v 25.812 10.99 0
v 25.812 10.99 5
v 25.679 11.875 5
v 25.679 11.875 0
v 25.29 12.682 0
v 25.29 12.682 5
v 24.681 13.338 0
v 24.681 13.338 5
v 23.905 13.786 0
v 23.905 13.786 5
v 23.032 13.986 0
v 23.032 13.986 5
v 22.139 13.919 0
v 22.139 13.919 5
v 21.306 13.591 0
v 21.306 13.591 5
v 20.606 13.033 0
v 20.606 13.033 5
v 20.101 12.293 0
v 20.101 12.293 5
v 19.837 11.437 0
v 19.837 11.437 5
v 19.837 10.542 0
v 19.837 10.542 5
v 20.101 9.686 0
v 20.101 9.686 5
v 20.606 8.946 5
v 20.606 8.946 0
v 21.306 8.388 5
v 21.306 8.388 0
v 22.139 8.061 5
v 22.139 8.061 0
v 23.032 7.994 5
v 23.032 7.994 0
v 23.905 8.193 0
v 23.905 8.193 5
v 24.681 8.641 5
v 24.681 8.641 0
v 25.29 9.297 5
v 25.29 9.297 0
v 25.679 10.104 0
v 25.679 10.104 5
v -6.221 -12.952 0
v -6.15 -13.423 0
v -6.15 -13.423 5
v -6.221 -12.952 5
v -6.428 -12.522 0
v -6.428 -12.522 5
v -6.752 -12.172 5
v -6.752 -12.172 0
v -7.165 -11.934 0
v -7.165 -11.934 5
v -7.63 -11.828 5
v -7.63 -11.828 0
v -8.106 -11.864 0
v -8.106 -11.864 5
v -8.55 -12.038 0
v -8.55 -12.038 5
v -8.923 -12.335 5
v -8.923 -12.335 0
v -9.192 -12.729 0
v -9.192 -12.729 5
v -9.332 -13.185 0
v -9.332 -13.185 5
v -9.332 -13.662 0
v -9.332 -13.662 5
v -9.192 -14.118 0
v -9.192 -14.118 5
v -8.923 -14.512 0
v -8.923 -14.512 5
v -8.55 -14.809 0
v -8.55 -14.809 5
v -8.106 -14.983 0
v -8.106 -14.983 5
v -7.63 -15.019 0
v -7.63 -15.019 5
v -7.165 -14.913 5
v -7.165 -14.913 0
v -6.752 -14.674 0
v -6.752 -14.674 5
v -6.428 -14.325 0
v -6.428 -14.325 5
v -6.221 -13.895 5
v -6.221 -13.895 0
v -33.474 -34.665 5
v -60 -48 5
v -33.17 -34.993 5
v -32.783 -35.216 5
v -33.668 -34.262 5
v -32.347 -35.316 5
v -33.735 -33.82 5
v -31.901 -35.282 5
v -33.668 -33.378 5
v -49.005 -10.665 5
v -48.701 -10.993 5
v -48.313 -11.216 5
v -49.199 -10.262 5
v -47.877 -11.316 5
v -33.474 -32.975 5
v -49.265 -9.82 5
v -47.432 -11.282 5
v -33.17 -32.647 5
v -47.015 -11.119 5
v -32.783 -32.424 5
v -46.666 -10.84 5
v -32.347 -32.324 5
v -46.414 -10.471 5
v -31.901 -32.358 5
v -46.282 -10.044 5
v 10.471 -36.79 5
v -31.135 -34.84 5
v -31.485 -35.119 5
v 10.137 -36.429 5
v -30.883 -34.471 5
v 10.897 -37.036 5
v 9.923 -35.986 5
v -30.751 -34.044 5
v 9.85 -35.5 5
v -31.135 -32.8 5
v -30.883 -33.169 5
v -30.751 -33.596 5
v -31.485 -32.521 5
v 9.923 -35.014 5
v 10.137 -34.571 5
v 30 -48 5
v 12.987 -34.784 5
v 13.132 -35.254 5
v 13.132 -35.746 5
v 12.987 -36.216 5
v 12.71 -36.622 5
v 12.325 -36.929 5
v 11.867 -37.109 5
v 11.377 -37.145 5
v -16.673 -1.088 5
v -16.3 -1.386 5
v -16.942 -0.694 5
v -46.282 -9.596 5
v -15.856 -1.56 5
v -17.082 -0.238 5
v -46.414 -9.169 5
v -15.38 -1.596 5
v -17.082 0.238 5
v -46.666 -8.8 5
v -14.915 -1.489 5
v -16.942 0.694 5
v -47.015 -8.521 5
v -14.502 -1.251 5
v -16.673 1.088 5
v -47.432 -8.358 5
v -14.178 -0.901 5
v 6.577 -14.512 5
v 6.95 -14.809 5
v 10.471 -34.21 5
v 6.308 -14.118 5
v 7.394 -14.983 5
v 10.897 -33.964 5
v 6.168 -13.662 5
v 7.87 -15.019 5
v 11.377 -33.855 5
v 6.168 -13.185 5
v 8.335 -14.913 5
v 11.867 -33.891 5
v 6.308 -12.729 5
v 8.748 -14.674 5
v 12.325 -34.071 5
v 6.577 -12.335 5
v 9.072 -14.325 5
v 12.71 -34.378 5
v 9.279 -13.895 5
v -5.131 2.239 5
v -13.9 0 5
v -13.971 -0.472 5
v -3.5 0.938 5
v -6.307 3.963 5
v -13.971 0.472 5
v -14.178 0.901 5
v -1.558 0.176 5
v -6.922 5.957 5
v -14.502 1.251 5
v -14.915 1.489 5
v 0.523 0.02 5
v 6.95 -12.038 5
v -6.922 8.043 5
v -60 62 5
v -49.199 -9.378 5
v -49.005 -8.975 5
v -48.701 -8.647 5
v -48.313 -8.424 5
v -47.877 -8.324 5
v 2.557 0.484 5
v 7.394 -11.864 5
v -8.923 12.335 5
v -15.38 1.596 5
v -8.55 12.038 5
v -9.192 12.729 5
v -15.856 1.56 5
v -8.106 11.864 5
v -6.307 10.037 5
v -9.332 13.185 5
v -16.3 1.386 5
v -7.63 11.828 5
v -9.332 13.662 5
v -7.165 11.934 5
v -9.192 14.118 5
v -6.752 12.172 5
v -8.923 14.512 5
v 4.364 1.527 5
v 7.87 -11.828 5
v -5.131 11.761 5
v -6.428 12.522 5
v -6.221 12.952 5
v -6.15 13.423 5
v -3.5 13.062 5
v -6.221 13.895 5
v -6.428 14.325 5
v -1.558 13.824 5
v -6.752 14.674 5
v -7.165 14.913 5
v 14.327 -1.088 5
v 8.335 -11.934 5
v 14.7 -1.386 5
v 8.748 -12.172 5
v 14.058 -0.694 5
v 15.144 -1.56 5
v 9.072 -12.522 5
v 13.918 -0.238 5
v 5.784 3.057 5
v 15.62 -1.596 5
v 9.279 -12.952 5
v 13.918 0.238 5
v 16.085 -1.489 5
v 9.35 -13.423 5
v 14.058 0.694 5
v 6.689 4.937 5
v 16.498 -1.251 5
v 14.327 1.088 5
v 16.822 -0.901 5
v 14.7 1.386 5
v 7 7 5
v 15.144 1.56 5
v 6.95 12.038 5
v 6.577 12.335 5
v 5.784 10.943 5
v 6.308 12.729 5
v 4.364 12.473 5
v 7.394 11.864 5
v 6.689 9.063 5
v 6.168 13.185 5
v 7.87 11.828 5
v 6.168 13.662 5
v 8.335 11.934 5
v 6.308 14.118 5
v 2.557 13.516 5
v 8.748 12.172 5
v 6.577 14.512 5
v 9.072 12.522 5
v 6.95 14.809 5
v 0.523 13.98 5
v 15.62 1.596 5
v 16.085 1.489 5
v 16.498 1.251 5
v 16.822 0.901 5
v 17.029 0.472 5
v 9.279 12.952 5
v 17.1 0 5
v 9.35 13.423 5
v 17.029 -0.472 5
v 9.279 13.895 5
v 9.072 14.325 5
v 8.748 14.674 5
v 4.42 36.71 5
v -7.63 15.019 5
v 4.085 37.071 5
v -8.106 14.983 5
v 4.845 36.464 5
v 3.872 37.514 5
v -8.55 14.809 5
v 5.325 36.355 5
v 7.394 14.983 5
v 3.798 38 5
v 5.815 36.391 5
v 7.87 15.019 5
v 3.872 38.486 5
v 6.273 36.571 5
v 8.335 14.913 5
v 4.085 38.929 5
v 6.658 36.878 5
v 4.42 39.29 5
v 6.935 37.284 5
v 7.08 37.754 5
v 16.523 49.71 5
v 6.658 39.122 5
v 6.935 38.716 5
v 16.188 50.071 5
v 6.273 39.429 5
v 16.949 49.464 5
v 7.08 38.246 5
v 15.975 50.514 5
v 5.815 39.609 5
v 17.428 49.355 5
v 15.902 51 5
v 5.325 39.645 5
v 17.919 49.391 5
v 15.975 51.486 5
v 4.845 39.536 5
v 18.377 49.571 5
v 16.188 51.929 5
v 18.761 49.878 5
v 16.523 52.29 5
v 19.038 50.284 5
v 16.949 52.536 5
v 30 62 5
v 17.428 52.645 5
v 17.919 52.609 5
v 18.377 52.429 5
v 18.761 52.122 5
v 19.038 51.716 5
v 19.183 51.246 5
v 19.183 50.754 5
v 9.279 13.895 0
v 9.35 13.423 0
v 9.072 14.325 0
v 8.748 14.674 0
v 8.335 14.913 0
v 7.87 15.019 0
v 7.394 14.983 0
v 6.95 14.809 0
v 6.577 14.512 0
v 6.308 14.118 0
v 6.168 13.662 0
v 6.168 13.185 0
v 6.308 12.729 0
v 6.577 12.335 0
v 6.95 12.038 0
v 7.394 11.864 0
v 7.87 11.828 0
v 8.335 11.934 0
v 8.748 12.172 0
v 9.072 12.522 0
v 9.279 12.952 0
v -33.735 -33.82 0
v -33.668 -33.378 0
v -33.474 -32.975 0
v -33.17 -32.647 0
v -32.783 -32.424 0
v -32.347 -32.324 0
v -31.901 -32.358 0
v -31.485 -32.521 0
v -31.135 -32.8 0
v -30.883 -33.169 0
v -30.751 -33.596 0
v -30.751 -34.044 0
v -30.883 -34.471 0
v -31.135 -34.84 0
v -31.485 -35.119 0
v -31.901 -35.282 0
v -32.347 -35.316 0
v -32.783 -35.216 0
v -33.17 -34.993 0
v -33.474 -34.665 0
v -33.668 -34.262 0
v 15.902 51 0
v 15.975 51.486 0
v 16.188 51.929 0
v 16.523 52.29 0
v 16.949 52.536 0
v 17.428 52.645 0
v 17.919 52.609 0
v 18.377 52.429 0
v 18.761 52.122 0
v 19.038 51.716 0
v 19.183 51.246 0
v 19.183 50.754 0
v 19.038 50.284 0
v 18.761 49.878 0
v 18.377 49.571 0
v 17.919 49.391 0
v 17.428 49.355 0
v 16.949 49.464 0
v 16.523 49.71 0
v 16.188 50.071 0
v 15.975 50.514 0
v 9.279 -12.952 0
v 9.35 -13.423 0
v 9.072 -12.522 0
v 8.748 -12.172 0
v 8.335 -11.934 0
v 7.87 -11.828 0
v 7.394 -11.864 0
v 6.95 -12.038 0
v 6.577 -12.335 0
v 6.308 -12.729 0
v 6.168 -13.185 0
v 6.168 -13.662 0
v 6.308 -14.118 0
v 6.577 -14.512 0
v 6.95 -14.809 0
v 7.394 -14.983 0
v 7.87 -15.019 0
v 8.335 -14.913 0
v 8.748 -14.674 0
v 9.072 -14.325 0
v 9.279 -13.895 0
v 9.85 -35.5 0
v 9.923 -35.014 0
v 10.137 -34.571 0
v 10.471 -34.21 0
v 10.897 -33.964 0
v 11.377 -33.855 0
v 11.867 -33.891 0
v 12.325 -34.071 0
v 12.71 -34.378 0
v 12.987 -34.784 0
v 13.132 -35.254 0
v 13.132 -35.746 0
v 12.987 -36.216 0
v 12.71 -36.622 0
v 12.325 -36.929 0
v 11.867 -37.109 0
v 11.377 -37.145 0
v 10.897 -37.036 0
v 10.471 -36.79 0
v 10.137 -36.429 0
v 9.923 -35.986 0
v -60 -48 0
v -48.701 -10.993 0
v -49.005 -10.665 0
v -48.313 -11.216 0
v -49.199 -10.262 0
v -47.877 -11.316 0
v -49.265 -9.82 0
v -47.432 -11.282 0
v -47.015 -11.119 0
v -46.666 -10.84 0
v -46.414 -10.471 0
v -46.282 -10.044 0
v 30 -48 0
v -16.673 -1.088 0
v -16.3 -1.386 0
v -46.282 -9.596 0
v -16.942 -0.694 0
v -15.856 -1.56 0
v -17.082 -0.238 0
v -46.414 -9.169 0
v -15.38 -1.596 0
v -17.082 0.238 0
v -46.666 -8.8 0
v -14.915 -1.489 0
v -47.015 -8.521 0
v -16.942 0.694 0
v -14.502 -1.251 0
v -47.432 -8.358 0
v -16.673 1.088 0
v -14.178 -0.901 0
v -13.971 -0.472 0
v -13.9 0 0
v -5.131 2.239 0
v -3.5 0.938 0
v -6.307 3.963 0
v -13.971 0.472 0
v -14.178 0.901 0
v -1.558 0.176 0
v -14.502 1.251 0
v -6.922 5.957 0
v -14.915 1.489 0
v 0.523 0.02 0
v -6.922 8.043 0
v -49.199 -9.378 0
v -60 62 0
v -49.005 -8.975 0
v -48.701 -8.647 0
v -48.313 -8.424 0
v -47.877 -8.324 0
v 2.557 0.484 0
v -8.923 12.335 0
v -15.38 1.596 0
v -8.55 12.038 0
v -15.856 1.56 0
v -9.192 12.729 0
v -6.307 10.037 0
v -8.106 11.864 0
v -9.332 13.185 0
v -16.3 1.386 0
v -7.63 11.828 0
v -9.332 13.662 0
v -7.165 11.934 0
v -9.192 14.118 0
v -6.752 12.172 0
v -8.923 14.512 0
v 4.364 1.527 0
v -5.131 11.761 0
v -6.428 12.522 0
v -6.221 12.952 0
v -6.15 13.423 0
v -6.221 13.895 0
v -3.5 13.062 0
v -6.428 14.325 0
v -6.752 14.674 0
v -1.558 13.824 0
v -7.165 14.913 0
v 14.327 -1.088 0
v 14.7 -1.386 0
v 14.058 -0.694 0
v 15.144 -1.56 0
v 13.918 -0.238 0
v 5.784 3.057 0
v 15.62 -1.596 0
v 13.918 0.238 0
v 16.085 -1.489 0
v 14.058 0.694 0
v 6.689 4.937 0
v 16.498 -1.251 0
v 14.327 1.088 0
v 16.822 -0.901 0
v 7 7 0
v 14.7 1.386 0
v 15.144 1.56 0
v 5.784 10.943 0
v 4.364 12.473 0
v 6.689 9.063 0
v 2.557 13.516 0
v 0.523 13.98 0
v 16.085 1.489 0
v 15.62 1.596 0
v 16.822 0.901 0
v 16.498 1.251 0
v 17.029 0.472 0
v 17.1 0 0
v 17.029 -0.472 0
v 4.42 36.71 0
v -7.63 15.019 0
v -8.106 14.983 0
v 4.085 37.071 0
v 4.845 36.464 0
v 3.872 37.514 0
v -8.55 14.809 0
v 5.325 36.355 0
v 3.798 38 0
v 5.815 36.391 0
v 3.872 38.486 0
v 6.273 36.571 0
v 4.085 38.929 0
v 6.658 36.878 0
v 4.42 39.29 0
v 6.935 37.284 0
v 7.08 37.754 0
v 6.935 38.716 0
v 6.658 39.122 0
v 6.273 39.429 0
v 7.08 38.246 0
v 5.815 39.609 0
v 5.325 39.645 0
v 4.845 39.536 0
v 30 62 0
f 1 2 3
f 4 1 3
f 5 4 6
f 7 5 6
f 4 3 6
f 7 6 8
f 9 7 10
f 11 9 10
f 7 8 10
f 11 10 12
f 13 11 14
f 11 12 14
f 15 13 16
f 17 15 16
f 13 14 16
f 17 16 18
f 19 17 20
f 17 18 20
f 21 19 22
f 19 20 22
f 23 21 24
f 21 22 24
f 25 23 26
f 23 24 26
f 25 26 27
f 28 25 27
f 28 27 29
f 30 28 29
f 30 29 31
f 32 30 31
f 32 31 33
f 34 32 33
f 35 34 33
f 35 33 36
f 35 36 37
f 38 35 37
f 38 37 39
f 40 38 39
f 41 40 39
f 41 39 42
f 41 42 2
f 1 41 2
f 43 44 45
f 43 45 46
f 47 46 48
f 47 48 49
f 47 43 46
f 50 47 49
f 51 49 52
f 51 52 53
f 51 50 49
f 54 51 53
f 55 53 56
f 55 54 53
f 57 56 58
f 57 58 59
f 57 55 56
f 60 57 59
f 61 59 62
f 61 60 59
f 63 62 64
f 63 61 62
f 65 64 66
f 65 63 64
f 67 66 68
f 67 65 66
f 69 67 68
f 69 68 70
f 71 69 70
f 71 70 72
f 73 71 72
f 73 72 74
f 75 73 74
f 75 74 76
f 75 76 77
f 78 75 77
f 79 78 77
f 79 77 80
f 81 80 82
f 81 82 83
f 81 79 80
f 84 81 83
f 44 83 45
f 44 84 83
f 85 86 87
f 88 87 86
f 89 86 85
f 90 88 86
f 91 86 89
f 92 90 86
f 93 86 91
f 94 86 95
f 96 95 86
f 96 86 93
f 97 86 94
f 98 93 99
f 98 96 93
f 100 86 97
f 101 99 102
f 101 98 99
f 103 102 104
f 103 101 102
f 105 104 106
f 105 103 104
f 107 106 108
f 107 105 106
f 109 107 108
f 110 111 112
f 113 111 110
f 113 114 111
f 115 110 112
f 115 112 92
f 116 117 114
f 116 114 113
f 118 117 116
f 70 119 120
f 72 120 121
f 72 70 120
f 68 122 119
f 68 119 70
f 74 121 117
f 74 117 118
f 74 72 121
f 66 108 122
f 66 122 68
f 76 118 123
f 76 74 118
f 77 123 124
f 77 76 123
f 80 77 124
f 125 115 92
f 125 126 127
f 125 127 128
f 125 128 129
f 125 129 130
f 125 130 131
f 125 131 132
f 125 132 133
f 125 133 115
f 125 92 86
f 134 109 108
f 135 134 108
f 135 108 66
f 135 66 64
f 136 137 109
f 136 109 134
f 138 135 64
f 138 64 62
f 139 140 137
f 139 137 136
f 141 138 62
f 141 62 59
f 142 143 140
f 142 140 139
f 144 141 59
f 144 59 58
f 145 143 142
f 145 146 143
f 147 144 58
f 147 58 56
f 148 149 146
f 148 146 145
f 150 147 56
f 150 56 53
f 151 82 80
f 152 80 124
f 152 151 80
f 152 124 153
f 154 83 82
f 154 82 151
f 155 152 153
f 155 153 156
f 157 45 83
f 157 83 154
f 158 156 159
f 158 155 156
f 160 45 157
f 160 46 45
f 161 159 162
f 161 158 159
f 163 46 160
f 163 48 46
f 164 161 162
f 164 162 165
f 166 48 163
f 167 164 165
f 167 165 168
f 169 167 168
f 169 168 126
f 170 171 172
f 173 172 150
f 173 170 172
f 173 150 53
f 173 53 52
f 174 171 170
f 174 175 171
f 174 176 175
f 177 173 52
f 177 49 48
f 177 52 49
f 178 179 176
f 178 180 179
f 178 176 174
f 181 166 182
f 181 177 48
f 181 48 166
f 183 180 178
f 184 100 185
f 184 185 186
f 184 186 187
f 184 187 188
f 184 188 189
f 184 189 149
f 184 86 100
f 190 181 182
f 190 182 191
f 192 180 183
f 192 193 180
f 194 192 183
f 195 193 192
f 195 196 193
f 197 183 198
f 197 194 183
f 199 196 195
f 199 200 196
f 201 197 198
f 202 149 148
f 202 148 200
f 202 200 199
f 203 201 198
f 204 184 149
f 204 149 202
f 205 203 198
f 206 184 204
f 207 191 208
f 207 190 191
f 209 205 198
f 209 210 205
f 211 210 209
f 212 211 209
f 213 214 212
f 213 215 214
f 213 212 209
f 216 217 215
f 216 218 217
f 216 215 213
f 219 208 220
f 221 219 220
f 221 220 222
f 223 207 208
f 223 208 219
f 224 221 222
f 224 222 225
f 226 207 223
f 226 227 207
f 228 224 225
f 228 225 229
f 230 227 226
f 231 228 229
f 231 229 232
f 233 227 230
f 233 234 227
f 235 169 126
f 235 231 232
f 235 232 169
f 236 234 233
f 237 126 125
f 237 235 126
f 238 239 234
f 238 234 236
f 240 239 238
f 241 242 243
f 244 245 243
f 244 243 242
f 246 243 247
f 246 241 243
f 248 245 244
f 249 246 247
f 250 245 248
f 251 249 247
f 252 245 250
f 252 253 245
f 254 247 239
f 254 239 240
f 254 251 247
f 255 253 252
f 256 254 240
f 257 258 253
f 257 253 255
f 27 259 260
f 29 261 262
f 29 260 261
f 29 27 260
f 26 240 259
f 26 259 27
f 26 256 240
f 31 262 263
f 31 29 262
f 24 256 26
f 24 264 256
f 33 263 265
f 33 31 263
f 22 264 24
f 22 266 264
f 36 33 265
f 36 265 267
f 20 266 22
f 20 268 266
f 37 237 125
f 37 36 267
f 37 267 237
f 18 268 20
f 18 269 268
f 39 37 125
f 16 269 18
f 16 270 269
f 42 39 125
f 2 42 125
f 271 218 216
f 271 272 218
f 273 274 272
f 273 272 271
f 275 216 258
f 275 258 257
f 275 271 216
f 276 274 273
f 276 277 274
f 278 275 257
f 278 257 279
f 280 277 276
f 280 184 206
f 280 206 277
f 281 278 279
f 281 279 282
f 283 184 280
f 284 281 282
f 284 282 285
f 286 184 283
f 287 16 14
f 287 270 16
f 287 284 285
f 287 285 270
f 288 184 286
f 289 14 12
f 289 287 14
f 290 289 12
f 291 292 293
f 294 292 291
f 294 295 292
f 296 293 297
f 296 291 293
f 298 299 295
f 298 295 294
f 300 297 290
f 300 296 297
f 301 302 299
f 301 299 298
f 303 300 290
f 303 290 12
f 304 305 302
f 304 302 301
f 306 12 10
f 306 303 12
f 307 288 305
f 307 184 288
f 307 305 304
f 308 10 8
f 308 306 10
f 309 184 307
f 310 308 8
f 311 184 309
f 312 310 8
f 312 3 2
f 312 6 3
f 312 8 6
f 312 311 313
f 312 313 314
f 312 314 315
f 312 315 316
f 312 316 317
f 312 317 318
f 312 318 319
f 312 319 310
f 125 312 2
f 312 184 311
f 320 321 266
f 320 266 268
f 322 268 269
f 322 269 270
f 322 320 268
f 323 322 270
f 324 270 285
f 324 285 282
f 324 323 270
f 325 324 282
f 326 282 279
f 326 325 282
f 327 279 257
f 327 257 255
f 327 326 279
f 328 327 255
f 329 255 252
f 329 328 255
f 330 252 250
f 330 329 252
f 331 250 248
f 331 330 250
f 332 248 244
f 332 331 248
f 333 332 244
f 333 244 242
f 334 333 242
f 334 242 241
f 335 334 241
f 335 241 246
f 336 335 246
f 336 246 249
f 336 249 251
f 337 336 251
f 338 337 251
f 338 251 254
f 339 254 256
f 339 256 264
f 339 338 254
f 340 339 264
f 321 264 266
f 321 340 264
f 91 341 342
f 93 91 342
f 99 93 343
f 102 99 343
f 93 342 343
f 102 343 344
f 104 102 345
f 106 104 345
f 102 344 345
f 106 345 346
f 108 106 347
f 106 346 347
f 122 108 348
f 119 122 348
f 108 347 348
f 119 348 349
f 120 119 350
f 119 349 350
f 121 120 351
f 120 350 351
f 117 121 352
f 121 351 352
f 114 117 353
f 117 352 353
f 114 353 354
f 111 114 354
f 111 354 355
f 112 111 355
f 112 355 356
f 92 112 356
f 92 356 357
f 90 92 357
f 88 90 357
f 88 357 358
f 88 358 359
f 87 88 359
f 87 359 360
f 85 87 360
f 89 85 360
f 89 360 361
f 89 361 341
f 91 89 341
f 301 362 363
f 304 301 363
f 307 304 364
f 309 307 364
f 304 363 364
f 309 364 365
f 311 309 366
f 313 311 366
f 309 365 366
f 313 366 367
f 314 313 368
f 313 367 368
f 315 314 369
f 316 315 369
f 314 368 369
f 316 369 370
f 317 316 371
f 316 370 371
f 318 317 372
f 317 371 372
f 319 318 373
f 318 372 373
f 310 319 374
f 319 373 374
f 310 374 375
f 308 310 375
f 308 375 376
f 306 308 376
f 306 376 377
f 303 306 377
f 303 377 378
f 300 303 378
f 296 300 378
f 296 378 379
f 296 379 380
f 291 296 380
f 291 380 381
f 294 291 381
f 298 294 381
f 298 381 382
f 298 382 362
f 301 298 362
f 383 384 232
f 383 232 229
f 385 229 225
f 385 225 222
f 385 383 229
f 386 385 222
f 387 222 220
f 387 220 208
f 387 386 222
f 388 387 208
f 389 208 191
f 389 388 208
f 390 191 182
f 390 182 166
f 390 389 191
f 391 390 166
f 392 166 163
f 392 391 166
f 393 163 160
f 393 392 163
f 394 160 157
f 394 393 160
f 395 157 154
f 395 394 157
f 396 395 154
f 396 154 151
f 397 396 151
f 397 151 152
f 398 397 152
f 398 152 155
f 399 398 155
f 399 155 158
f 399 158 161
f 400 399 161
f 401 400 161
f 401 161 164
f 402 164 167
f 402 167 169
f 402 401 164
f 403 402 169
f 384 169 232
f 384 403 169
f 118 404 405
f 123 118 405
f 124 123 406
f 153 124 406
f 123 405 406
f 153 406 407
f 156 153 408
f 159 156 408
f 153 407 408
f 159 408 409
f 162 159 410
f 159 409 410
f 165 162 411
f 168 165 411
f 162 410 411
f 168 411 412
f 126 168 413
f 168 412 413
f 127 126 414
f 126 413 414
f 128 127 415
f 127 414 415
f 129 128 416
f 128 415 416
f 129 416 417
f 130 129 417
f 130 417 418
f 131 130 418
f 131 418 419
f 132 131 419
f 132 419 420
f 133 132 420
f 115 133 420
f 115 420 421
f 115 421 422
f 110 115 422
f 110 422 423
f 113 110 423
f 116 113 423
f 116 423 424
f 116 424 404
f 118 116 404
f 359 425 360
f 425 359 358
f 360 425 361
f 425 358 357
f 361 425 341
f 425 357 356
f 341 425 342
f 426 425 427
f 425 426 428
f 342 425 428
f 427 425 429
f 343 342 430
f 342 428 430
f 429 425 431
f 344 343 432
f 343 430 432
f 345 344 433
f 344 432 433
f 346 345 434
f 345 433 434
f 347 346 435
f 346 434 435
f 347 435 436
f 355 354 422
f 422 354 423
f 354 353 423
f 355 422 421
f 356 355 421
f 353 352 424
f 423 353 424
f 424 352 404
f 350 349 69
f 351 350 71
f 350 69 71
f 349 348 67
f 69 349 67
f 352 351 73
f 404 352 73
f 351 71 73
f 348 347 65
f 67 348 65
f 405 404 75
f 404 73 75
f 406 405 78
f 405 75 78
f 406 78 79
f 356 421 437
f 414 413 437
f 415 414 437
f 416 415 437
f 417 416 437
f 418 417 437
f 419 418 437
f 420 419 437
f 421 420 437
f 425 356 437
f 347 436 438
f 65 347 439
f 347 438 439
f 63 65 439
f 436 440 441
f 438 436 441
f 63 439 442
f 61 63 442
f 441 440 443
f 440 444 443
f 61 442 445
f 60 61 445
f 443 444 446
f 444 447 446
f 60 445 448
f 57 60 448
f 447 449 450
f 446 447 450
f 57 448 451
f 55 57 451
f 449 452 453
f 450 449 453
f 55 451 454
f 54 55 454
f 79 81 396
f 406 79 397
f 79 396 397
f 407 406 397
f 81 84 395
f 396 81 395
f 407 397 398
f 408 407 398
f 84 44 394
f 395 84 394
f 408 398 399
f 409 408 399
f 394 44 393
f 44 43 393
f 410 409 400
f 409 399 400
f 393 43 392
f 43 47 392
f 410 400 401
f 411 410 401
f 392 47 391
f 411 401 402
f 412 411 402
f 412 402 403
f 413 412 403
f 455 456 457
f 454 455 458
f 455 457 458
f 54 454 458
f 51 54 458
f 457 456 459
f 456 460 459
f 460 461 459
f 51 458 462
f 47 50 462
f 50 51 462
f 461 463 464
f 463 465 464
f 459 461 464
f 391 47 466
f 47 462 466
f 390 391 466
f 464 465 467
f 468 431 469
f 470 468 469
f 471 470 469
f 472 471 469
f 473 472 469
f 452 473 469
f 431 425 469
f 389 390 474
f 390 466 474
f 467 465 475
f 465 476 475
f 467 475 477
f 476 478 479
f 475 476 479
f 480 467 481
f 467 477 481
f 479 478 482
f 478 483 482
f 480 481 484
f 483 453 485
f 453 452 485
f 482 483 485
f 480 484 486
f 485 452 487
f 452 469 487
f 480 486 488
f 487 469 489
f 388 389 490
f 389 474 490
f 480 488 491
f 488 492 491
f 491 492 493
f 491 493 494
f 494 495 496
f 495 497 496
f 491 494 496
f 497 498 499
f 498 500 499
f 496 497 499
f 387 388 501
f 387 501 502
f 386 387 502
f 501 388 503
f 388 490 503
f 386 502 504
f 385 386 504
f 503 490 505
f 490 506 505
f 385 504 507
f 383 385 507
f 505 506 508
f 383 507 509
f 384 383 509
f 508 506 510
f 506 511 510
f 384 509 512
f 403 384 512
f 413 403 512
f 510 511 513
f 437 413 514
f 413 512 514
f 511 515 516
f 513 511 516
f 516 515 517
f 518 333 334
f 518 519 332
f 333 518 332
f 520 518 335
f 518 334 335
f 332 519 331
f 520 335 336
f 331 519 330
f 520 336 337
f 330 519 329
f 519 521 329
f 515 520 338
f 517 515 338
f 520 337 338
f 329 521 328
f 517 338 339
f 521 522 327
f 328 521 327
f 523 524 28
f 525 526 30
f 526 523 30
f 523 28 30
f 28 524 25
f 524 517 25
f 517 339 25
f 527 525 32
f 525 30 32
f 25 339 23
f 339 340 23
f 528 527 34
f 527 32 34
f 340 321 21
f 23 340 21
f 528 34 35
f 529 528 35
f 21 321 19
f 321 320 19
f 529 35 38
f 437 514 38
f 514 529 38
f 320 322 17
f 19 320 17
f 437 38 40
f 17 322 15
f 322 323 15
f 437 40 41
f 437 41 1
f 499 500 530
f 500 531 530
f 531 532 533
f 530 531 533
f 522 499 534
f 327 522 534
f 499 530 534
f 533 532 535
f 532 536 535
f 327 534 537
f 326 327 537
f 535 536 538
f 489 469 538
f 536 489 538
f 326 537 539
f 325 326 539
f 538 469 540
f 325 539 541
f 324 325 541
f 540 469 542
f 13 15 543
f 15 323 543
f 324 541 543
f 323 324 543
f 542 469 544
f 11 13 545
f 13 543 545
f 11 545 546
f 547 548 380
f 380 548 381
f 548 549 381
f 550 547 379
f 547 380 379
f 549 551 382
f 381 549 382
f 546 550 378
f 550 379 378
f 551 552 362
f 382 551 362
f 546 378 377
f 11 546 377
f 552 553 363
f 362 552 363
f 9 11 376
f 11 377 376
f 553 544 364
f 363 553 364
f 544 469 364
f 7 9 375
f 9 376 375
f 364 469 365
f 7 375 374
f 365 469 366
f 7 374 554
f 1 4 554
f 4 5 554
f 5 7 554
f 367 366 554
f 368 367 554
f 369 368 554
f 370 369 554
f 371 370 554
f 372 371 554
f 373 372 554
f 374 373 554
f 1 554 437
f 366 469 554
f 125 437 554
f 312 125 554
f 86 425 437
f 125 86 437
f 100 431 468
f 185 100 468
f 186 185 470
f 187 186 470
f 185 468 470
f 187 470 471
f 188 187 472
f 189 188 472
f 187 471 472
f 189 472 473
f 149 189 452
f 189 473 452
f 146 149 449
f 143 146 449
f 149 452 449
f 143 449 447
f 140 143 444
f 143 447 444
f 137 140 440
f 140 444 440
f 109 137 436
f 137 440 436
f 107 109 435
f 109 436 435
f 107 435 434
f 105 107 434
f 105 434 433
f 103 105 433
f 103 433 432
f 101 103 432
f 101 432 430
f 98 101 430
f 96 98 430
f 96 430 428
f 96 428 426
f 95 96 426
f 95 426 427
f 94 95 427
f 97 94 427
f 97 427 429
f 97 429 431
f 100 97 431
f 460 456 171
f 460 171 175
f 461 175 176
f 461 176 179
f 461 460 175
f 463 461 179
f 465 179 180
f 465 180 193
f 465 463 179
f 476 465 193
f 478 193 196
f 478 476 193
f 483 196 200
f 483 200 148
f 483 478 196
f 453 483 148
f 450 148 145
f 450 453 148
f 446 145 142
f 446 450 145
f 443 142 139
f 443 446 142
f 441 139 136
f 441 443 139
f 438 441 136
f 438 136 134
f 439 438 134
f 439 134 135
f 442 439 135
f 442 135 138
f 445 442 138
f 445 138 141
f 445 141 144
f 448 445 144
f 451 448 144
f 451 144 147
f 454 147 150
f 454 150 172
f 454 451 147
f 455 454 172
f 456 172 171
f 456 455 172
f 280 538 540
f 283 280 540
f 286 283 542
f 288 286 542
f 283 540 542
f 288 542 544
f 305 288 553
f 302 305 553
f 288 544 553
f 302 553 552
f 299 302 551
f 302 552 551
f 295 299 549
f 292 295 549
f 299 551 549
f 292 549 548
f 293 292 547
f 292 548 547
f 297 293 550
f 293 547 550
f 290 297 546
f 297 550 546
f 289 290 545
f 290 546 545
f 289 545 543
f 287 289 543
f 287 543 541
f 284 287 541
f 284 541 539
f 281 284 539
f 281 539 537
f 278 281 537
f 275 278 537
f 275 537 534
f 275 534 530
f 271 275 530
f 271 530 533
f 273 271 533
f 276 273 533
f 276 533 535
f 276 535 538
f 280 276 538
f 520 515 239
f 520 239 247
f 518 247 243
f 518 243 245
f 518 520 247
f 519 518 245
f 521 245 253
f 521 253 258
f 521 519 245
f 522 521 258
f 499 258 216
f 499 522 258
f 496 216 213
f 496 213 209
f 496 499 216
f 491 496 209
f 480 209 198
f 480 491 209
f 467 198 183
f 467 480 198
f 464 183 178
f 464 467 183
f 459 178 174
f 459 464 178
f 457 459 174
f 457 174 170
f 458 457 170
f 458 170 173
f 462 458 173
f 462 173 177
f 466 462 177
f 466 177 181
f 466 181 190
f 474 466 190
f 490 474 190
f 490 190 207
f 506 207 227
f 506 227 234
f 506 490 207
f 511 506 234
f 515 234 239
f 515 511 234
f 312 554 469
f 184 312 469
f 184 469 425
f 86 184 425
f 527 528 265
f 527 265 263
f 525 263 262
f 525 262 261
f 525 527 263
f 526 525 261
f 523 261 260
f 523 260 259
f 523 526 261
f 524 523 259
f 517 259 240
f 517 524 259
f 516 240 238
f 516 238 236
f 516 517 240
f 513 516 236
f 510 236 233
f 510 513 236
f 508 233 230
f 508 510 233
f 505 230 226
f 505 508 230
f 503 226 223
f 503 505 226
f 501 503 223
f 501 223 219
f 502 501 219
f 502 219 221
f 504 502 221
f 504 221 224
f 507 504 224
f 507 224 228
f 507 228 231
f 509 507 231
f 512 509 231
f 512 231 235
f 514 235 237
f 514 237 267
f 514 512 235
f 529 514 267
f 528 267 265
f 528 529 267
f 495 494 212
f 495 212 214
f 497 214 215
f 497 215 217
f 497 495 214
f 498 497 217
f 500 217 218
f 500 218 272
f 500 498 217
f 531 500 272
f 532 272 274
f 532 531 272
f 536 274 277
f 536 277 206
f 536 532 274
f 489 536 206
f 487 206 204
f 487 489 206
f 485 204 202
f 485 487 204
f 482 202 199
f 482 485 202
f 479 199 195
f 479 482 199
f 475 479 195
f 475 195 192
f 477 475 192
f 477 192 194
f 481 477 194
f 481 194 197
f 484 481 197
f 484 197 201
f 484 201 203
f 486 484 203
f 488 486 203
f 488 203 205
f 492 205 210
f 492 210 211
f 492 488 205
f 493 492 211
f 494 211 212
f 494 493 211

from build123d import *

# Parameters (mm, degrees)
SKETCH_2_R          = 1.6
SKETCH_2_R_2        = 7
EXTRUDE_1_DEPTH     = 5
SKETCH_4_R          = 3.004319303
CUT_EXTRUDE_2_DEPTH = 10
SKETCH_5_R          = 1.65
SKETCH_5_R_2        = 1.5
CUT_EXTRUDE_3_DEPTH = 10


with BuildPart() as part:
    # Эскиз2 → Бобышка-Вытянуть1 (new body)
    with BuildSketch(Plane.XY):
        Polygon((-25, 62), (-60, 62), (-60, -48), (-25, -48), (30, -48), (30, 62), align=None)
        with Locations((-15.5, 0)):
            Circle(SKETCH_2_R, mode=Mode.SUBTRACT)
        with Locations((-7.75, 13.423393759)):
            Circle(SKETCH_2_R, mode=Mode.SUBTRACT)
        with Locations((7.75, 13.423393759)):
            Circle(SKETCH_2_R, mode=Mode.SUBTRACT)
        with Locations((15.5, 0)):
            Circle(SKETCH_2_R, mode=Mode.SUBTRACT)
        with Locations((7.75, -13.423393759)):
            Circle(SKETCH_2_R, mode=Mode.SUBTRACT)
        with Locations((-7.75, -13.423393759)):
            Circle(SKETCH_2_R, mode=Mode.SUBTRACT)
        with Locations((0, 7)):
            Circle(SKETCH_2_R_2, mode=Mode.SUBTRACT)
    extrude(amount=EXTRUDE_1_DEPTH)

    # Эскиз4 → Вырез-Вытянуть2 (cut)
    with BuildSketch(Plane.XY.offset(5)):
        with Locations((22.80785145, 10.989617997)):
            Circle(SKETCH_4_R)
    extrude(amount=-CUT_EXTRUDE_2_DEPTH, mode=Mode.SUBTRACT)

    # Эскиз5 → Вырез-Вытянуть3 (cut)
    with BuildSketch(Plane(origin=(0, 0, 0), x_dir=(-1, 0, 0), z_dir=(0, 0, -1))):
        with Locations((-17.551724138, 51)):
            Circle(SKETCH_5_R)
        with Locations((-5.448275862, 38)):
            Circle(SKETCH_5_R)
        with Locations((32.234685073, -33.82)):
            Circle(SKETCH_5_R_2)
        with Locations((47.765314927, -9.82)):
            Circle(SKETCH_5_R_2)
        with Locations((-11.5, -35.5)):
            Circle(SKETCH_5_R)
    extrude(amount=-CUT_EXTRUDE_3_DEPTH, mode=Mode.SUBTRACT)


solid = part.part
